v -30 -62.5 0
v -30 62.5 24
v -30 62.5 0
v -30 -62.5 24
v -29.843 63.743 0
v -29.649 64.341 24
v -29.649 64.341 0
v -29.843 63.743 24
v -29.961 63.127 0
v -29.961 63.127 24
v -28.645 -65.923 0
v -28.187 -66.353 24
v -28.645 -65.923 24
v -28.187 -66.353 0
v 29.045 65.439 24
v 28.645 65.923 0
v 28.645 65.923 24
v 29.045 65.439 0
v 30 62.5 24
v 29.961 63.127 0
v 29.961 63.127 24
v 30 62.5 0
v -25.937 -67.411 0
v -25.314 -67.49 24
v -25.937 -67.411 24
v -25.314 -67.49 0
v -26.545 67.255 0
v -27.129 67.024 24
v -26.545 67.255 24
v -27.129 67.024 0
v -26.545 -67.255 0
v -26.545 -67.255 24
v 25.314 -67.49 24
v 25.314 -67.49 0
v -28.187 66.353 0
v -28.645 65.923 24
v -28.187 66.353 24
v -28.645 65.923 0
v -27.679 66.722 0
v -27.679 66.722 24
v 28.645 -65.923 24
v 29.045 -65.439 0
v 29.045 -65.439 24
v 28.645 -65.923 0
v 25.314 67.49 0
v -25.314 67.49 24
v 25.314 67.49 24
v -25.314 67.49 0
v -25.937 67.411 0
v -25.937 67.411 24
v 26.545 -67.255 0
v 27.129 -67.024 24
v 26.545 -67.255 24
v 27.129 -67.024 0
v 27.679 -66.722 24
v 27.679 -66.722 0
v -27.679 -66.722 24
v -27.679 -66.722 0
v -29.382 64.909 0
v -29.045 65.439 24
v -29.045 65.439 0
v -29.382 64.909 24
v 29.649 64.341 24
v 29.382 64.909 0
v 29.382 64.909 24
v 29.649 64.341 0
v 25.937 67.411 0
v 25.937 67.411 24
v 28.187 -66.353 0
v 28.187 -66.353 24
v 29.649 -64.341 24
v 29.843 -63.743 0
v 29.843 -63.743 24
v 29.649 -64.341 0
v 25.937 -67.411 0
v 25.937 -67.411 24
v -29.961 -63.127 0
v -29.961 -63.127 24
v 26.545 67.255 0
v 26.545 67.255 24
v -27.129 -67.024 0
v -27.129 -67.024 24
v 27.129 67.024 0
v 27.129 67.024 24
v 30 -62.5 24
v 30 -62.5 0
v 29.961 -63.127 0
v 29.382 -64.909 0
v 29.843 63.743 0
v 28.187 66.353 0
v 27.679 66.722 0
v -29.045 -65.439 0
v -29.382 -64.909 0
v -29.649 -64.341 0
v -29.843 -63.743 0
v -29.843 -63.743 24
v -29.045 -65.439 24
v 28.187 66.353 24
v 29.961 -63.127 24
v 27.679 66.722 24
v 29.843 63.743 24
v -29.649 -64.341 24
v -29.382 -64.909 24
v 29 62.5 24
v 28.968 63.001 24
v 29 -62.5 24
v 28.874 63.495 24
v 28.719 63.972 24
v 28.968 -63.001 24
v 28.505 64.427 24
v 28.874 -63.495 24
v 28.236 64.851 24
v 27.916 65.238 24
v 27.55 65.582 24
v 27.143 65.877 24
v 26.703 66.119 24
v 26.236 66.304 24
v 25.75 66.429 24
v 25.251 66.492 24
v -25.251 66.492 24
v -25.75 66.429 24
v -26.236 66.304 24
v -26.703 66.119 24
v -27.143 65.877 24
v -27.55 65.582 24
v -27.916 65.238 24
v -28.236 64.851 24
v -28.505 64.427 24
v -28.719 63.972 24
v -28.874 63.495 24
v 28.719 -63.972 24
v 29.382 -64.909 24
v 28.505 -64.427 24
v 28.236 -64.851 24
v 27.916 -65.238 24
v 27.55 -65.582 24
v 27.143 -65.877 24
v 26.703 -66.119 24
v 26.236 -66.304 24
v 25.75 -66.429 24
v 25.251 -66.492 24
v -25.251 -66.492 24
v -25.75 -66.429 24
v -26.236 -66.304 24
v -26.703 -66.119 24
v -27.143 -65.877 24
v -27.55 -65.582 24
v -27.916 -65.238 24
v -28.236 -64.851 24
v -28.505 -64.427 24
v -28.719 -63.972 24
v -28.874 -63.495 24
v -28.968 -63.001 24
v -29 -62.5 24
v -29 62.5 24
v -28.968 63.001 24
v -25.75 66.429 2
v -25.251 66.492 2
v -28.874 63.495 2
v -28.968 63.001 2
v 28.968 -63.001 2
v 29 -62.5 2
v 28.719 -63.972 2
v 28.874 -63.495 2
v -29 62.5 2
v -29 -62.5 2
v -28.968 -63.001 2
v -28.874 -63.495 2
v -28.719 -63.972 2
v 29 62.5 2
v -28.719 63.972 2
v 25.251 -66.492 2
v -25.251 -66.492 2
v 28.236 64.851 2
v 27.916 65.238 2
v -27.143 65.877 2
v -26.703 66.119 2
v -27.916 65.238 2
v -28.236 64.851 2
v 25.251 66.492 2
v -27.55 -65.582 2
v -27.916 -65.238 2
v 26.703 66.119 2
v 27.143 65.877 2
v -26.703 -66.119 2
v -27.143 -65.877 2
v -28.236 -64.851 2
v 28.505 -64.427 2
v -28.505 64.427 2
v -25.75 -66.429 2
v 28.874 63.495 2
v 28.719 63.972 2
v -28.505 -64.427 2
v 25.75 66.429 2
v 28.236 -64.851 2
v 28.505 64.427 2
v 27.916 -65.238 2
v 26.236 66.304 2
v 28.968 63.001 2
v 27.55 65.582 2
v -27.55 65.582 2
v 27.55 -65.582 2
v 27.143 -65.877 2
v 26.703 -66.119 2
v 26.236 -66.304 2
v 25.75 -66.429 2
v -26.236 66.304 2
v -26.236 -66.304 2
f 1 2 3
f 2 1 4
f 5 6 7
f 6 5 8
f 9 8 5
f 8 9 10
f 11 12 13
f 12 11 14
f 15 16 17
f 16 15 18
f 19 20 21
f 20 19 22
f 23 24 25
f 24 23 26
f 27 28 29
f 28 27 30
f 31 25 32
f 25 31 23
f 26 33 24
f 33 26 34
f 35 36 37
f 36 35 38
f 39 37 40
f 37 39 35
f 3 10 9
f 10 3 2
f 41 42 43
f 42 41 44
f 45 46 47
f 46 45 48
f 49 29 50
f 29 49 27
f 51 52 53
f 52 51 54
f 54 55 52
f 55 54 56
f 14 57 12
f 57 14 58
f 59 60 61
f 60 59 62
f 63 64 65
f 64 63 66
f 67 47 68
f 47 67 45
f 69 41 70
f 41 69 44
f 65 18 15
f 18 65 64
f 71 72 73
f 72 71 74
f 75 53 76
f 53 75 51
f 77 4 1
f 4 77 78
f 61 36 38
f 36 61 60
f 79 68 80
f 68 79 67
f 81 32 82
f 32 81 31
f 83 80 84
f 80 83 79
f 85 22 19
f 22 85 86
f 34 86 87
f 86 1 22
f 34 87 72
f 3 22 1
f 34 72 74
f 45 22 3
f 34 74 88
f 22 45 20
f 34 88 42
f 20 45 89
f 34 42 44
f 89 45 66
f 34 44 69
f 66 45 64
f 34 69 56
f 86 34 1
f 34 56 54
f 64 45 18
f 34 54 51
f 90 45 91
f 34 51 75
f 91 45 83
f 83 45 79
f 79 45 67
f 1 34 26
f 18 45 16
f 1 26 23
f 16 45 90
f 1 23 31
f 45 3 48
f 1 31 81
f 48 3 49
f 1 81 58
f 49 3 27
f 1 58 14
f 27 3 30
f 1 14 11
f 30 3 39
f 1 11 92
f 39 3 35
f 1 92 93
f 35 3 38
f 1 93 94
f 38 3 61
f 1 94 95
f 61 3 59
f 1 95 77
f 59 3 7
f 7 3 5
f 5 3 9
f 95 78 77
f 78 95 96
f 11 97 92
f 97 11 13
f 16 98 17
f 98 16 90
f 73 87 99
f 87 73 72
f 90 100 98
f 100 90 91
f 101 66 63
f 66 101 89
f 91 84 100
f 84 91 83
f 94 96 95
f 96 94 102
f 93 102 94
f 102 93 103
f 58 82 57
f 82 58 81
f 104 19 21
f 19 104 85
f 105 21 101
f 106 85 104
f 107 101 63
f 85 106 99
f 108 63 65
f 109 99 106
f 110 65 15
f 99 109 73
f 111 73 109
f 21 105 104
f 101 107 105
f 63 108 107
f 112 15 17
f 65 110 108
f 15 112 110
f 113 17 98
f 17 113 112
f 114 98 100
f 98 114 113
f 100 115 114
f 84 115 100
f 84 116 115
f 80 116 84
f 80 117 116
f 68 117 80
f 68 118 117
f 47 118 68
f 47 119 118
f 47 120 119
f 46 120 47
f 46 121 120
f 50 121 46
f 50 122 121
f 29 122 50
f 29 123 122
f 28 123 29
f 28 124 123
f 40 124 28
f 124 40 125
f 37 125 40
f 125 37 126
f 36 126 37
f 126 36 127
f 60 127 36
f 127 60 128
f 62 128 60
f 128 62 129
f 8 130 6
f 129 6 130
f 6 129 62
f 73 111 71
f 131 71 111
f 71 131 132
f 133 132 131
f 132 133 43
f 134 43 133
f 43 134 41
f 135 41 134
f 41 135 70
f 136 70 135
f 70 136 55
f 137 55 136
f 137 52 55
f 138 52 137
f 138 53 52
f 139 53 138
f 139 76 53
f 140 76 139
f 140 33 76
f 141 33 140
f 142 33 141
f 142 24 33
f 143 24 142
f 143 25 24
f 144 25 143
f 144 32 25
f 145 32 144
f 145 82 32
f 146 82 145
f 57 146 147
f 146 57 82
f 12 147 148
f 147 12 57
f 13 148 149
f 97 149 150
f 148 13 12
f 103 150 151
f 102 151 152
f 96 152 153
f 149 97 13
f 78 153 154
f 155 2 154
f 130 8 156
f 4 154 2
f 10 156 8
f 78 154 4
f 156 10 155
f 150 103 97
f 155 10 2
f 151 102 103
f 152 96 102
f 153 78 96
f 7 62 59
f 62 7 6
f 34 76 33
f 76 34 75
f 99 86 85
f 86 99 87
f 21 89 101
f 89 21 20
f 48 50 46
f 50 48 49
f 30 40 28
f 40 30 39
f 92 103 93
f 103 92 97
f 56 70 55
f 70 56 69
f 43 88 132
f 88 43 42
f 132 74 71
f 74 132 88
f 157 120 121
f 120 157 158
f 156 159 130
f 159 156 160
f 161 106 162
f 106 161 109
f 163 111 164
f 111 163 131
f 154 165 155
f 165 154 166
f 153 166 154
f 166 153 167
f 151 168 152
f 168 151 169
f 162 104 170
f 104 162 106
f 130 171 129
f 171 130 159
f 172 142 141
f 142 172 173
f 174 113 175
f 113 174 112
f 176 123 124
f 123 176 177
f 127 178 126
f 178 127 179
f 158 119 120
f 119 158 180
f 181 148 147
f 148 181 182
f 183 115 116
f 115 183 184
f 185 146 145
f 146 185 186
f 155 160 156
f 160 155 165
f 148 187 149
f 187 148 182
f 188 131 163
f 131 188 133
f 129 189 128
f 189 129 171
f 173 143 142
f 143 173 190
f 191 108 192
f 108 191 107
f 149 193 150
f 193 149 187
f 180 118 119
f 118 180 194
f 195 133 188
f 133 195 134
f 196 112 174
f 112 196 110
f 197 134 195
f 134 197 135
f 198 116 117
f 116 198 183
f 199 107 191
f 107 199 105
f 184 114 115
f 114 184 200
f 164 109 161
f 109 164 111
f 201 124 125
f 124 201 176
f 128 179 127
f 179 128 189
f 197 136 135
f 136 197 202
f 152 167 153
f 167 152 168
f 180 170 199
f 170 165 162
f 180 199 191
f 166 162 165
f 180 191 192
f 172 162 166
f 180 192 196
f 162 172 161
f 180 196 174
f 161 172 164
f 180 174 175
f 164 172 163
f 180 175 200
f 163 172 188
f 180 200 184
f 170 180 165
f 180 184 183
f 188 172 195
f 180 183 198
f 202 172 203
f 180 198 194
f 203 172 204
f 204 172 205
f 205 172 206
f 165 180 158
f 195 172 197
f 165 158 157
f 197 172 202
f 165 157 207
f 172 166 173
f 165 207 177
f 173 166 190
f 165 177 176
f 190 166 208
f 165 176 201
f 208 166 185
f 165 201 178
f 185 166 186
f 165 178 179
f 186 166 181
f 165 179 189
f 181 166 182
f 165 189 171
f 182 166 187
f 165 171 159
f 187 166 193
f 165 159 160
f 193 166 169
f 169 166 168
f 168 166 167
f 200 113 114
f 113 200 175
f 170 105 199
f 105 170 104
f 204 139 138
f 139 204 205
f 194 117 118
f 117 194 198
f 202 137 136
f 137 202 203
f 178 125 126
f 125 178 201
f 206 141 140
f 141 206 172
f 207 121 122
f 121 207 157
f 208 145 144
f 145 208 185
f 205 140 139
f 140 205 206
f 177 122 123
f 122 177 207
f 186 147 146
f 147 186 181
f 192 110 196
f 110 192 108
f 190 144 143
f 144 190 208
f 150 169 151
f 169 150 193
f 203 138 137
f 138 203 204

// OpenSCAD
$fn = 50;


difference() {
	union() {
		hull() {
			translate(v = [-25.0000000000, 62.5000000000, 0]) {
				cylinder(h = 24, r = 5);
			}
			translate(v = [25.0000000000, 62.5000000000, 0]) {
				cylinder(h = 24, r = 5);
			}
			translate(v = [-25.0000000000, -62.5000000000, 0]) {
				cylinder(h = 24, r = 5);
			}
			translate(v = [25.0000000000, -62.5000000000, 0]) {
				cylinder(h = 24, r = 5);
			}
		}
	}
	union() {
		translate(v = [0, 0, 2]) {
			hull() {
				translate(v = [-25.0000000000, 62.5000000000, 0]) {
					cylinder(h = 22, r = 4);
				}
				translate(v = [25.0000000000, 62.5000000000, 0]) {
					cylinder(h = 22, r = 4);
				}
				translate(v = [-25.0000000000, -62.5000000000, 0]) {
					cylinder(h = 22, r = 4);
				}
				translate(v = [25.0000000000, -62.5000000000, 0]) {
					cylinder(h = 22, r = 4);
				}
			}
		}
	}
}
